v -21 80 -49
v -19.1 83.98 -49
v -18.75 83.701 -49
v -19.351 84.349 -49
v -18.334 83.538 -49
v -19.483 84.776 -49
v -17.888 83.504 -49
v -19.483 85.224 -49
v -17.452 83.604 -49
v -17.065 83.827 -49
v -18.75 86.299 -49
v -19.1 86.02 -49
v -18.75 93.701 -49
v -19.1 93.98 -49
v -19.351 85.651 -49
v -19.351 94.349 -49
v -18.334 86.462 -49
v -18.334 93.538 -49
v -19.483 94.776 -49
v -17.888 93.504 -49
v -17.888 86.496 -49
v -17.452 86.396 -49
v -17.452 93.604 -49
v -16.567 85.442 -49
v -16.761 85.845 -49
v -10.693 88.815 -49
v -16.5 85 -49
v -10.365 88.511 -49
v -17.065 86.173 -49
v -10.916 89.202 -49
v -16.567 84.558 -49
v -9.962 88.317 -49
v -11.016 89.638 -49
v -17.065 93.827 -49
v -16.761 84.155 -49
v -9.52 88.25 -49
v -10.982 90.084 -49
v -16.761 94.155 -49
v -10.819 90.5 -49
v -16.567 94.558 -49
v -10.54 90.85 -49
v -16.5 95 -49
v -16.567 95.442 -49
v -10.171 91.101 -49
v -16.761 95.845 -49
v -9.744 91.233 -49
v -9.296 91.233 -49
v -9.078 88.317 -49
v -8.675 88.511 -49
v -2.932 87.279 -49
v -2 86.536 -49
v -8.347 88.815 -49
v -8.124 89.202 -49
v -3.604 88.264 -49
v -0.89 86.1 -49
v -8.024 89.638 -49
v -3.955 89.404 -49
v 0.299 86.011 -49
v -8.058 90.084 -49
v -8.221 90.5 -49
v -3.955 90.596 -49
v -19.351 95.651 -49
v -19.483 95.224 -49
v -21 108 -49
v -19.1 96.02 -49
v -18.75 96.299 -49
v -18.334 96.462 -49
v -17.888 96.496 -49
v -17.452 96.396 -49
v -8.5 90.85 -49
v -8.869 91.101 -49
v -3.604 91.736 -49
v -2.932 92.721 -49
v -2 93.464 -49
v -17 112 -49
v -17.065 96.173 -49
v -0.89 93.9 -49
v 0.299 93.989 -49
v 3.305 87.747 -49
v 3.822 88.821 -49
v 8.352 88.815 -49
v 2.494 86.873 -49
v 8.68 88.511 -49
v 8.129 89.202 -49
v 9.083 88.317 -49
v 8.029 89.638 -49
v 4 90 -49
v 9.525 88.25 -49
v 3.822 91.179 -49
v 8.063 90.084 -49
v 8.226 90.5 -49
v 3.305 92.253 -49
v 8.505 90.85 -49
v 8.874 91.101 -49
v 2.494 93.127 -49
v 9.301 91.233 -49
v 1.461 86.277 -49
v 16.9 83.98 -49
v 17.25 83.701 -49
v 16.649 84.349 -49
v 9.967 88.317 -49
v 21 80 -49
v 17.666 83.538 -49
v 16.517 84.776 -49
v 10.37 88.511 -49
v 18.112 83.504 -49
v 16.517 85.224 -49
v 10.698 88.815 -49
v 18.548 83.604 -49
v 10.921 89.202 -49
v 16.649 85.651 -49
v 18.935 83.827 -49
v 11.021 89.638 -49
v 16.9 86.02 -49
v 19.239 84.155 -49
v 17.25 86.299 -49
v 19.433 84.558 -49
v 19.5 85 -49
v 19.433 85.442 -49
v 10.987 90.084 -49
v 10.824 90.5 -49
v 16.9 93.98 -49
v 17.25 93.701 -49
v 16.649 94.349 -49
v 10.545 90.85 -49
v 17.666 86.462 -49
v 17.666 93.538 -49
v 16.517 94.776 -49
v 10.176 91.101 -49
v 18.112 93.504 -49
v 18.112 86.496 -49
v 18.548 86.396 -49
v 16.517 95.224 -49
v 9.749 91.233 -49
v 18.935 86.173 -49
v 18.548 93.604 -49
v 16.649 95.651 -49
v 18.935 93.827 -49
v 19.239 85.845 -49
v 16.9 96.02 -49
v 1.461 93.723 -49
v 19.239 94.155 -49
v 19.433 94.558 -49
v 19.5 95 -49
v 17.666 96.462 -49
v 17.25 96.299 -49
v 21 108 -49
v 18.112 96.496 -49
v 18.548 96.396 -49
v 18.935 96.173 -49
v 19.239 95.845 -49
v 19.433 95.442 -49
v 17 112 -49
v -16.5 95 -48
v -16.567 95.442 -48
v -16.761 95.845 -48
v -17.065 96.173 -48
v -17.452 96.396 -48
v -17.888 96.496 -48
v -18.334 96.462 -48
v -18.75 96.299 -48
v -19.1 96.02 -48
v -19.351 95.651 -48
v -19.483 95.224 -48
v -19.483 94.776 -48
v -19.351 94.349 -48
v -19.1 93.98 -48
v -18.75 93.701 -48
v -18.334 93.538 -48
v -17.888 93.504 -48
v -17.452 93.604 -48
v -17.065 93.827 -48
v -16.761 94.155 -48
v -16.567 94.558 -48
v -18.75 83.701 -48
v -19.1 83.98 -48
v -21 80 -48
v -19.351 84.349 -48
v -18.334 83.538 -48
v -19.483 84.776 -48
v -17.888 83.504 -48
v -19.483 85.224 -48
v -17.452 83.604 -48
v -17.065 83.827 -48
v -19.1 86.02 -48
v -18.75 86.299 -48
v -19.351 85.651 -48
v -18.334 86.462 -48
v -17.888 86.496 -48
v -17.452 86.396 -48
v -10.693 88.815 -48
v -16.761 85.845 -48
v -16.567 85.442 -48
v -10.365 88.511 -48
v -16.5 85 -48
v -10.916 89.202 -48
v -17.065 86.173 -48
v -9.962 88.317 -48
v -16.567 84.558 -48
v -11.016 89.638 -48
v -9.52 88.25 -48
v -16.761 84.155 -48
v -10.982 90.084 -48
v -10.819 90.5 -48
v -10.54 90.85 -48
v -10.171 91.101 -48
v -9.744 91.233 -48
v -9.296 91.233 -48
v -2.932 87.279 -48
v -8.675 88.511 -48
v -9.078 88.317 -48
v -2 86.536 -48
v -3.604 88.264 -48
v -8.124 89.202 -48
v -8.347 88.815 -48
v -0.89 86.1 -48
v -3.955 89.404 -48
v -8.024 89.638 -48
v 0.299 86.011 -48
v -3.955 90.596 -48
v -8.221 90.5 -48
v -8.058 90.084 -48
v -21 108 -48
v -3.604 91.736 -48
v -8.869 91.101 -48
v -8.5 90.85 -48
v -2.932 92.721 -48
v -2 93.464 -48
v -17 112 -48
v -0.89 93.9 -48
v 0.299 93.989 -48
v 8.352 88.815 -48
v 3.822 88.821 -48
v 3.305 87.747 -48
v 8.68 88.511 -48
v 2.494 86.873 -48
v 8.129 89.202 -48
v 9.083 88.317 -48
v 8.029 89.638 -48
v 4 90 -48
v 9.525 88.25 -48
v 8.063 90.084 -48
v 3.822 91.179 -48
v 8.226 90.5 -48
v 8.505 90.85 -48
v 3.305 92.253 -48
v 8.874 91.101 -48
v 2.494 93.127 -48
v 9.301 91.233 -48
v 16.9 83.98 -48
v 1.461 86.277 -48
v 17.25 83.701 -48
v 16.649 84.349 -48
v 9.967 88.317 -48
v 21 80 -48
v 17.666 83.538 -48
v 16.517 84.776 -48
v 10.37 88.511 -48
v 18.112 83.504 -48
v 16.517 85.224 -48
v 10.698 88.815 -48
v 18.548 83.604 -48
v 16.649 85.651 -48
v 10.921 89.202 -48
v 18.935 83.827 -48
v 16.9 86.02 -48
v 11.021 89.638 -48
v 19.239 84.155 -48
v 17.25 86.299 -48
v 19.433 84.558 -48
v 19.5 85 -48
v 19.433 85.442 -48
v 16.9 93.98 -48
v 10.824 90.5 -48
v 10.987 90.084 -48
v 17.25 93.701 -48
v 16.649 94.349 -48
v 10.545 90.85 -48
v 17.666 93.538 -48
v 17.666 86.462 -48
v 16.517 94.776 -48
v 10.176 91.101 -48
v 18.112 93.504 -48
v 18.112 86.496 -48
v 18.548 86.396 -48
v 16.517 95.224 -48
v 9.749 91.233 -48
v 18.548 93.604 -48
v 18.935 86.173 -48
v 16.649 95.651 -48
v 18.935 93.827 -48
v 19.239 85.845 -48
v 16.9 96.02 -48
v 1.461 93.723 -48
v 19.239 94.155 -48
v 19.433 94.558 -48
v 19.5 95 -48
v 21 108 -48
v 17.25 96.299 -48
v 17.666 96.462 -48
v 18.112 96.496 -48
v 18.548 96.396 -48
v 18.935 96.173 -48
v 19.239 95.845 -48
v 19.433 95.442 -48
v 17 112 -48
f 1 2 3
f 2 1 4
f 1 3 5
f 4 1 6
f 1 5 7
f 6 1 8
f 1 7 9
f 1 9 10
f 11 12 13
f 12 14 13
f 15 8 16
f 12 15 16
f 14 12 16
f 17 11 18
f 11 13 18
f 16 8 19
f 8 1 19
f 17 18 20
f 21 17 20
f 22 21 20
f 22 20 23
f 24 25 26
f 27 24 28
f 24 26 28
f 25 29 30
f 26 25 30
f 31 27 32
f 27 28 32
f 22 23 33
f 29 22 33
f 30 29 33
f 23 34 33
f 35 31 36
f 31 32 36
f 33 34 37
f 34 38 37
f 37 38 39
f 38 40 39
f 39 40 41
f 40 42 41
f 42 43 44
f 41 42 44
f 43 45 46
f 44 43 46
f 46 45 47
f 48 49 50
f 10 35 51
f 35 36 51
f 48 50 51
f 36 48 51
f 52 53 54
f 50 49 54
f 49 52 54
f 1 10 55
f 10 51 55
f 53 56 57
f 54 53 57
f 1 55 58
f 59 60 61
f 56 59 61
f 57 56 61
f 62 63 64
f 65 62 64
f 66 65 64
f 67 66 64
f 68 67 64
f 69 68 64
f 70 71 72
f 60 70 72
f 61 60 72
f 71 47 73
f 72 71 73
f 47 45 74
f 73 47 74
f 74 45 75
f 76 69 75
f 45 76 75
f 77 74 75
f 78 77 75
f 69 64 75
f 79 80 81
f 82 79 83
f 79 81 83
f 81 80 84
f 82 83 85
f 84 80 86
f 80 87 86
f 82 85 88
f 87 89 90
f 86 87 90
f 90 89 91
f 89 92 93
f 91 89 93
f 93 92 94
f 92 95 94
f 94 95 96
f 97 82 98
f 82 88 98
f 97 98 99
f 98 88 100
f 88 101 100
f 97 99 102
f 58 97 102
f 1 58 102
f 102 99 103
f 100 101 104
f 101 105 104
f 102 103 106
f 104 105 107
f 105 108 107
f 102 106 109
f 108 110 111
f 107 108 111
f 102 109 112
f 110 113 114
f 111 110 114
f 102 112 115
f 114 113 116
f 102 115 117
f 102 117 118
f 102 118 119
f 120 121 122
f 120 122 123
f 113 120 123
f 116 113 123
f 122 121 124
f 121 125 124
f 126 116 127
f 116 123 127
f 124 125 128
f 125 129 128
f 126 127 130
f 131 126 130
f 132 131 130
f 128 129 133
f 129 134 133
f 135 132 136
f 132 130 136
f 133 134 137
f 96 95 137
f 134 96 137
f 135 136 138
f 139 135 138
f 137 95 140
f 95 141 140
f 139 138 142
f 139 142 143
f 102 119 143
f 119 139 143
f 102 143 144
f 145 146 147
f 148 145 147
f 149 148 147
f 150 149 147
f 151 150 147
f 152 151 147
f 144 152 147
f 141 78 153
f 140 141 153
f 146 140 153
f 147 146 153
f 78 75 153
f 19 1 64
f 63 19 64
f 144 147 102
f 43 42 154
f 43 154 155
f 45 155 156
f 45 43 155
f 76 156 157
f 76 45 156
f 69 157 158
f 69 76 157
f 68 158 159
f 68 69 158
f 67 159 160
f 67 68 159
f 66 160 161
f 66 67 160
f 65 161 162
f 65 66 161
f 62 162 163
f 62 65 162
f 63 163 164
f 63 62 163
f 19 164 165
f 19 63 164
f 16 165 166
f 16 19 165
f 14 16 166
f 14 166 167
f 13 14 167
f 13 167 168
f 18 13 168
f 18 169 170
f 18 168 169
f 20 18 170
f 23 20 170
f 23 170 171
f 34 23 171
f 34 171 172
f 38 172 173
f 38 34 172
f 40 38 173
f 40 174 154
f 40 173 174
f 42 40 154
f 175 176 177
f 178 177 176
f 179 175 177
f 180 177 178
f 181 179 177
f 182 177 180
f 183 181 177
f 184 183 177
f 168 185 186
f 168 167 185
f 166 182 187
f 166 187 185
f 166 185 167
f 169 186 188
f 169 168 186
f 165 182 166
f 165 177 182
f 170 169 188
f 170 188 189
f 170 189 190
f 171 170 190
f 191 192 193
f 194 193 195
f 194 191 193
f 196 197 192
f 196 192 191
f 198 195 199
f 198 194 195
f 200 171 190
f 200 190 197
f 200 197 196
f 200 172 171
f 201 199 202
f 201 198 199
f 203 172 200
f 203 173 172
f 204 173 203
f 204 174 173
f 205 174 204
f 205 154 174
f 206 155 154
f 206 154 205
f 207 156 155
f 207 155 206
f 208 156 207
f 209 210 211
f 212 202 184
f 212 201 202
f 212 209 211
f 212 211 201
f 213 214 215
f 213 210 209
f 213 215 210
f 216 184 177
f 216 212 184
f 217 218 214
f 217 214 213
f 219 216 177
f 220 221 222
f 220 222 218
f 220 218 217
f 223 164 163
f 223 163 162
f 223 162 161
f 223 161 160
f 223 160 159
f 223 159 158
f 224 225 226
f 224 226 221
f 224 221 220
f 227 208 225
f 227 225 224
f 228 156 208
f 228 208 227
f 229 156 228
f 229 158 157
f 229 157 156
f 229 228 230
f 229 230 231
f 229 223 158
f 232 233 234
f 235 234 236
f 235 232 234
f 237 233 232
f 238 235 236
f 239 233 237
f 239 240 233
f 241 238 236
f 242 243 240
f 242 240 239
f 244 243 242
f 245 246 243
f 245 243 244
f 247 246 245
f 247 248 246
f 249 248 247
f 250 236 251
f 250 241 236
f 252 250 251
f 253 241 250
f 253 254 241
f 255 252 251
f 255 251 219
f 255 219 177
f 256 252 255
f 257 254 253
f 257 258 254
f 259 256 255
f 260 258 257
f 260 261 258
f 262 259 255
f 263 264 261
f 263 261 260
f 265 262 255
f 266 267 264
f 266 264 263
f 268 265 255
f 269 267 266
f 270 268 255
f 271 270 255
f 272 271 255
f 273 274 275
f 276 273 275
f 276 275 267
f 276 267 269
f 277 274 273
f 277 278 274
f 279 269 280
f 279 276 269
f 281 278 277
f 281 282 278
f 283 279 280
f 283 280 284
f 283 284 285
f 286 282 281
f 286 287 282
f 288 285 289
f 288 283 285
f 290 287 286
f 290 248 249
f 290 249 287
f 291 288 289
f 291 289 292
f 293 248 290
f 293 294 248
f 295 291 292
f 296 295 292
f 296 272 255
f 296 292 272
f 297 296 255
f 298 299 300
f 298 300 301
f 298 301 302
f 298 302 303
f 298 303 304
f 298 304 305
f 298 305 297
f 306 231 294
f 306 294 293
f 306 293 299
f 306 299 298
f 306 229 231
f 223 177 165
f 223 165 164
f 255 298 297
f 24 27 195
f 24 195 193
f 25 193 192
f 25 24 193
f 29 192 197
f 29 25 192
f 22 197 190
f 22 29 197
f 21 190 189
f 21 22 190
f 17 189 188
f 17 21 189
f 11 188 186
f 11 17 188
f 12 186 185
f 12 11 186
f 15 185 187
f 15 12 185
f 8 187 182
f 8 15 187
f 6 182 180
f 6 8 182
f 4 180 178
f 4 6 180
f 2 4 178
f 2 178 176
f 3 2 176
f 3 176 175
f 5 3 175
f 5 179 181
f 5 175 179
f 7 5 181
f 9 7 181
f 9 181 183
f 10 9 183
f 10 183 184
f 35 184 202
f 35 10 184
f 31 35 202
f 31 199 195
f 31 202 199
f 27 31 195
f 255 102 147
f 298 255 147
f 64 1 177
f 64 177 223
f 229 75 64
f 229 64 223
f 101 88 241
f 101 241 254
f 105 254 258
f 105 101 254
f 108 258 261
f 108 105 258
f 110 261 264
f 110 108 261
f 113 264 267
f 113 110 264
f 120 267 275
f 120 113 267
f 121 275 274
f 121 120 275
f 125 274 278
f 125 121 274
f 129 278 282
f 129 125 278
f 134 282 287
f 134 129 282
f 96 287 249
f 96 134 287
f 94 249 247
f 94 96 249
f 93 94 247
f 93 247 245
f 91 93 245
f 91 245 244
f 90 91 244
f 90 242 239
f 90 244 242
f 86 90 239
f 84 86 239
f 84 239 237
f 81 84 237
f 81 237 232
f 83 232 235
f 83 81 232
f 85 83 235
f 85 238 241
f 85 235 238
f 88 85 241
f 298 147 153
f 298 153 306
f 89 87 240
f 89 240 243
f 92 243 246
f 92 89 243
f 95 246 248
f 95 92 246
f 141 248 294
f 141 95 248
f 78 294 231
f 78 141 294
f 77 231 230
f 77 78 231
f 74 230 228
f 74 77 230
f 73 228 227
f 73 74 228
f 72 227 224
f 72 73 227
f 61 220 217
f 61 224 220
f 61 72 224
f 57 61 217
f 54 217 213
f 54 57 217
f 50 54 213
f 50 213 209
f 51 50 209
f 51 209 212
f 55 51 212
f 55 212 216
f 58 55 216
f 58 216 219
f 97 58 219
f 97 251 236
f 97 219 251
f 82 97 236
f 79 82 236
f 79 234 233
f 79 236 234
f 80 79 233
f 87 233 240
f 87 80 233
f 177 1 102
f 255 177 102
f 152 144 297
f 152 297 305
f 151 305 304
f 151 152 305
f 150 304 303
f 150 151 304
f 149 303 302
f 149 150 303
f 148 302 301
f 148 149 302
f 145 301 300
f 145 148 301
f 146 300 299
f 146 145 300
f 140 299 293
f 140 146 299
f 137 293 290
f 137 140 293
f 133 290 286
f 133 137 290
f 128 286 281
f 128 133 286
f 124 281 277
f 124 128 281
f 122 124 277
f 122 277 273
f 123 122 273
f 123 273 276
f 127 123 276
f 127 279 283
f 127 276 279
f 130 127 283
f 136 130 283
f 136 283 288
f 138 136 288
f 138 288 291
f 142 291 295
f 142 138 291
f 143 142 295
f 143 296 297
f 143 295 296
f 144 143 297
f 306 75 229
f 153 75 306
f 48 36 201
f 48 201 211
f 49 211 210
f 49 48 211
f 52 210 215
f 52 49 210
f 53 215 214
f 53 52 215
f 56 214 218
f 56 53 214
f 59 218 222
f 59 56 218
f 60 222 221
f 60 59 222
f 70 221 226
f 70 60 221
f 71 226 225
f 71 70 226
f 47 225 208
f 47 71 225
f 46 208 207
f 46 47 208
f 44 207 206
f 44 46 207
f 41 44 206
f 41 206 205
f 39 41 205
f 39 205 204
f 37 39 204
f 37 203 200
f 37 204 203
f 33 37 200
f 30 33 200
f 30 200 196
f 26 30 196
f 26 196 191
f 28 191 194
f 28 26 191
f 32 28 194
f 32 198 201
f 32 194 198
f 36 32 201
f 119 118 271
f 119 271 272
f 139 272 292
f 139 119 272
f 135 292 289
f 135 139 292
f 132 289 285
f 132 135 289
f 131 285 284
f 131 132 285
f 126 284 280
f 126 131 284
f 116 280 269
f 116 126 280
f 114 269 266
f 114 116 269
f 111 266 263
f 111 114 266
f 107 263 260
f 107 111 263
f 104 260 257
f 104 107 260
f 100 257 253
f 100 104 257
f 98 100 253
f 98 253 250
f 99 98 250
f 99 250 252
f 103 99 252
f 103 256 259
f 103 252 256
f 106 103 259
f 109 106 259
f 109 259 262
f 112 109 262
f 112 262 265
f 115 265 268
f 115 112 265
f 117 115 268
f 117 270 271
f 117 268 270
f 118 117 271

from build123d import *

# Parameters (mm, degrees)
CYLINDER1671_R              = 1.5
CYLINDER1671_DEPTH          = 20
CYLINDER1670_R              = 1.5
CYLINDER1670_DEPTH          = 20
COMPOUND820_ROLL_ANGLE      = 90
COMPOUND820_PLACEMENT_ANGLE = 90
CYLINDER1622_R              = 1.5
CYLINDER1622_DEPTH          = 60
CYLINDER1623_R              = 1.5
CYLINDER1623_DEPTH          = 60
CYLINDER1624_R              = 1.5
CYLINDER1624_DEPTH          = 60
CYLINDER1621_R              = 1.5
CYLINDER1621_DEPTH          = 60
CYLINDER1629_R              = 4
CYLINDER1629_DEPTH          = 48
BOX656_W                    = 42
BOX656_H                    = 32
BOX656_DEPTH                = 1
CHAMFER046_SIZE             = 4


with BuildPart() as v_lec1671:
    # Cylinder1671 → Cylinder1671 (new body)
    with BuildSketch(Plane(origin=(15.75, 114, 58.525), x_dir=(-1, 0, 0), z_dir=(0, 1, 0))):
        Circle(CYLINDER1671_R)
    extrude(amount=CYLINDER1671_DEPTH)


with BuildPart() as compound821:
    # Cylinder1670 → Cylinder1670 (new body)
    with BuildSketch(Plane(origin=(15.75, 114, 39.48), x_dir=(-1, 0, 0), z_dir=(0, 1, 0))):
        Circle(CYLINDER1670_R)
    extrude(amount=CYLINDER1670_DEPTH)

    # Compound820: union Válec1671
    add(v_lec1671.part)


with BuildPart() as compound821_1:
    # Compound820 roll: moved
    add(compound821.part.rotate(Axis((0, 0, 0), (1, 0, 0)), COMPOUND820_ROLL_ANGLE))


with BuildPart() as compound821_2:
    # Compound820 placement: moved
    add(compound821_1.part.moved(Location((-49, 0, -96))).rotate(Axis((-49, 0, -96), (0, 0, 1)), COMPOUND820_PLACEMENT_ANGLE))


with BuildPart() as compound821_3:
    # Compound821 placement: moved
    add(compound821_2.part.moved(Location((0, 74, -80))))


with BuildPart() as v_lec1622:
    # Cylinder1622 → Cylinder1622 (new body)
    with BuildSketch(Plane(origin=(18, 85, -57), x_dir=(1, 0, 0), z_dir=(0, 0, 1))):
        Circle(CYLINDER1622_R)
    extrude(amount=CYLINDER1622_DEPTH)


with BuildPart() as v_lec1623:
    # Cylinder1623 → Cylinder1623 (new body)
    with BuildSketch(Plane(origin=(-18, 85, -57), x_dir=(1, 0, 0), z_dir=(0, 0, 1))):
        Circle(CYLINDER1623_R)
    extrude(amount=CYLINDER1623_DEPTH)


with BuildPart() as v_lec1624:
    # Cylinder1624 → Cylinder1624 (new body)
    with BuildSketch(Plane(origin=(-18, 95, -57), x_dir=(1, 0, 0), z_dir=(0, 0, 1))):
        Circle(CYLINDER1624_R)
    extrude(amount=CYLINDER1624_DEPTH)


with BuildPart() as compound806:
    # Cylinder1621 → Cylinder1621 (new body)
    with BuildSketch(Plane(origin=(18, 95, -57), x_dir=(1, 0, 0), z_dir=(0, 0, 1))):
        Circle(CYLINDER1621_R)
    extrude(amount=CYLINDER1621_DEPTH)

    # Compound806: union Válec1622, Válec1623, Válec1624
    add(v_lec1622.part)
    add(v_lec1623.part)
    add(v_lec1624.part)


with BuildPart() as v_lec1629:
    # Cylinder1629 → Cylinder1629 (new body)
    with BuildSketch(Plane(origin=(0, 90, -55), x_dir=(1, 0, 0), z_dir=(0, 0, 1))):
        Circle(CYLINDER1629_R)
    extrude(amount=CYLINDER1629_DEPTH)


with BuildPart() as chamfer046:
    # Box656 → Box656 (new body)
    with BuildSketch(Plane(origin=(-21, 80, -49), x_dir=(1, 0, 0), z_dir=(0, 0, 1))):
        with Locations((21, 16)):
            Rectangle(BOX656_W, BOX656_H)
    extrude(amount=BOX656_DEPTH)

    # Cut318: cut Válec1629
    add(v_lec1629.part, mode=Mode.SUBTRACT)

    # Cut320: cut Compound806
    add(compound806.part, mode=Mode.SUBTRACT)

    # Cut333: cut Compound821
    add(compound821_3.part, mode=Mode.SUBTRACT)

    # Chamfer046
    chamfer046_edges = [chamfer046.edges().sort_by_distance(p)[0] for p in [
        (-21, 112, -48.5),
        (21, 112, -48.5),
    ]]
    chamfer(chamfer046_edges, length=CHAMFER046_SIZE)


solid = chamfer046.part
